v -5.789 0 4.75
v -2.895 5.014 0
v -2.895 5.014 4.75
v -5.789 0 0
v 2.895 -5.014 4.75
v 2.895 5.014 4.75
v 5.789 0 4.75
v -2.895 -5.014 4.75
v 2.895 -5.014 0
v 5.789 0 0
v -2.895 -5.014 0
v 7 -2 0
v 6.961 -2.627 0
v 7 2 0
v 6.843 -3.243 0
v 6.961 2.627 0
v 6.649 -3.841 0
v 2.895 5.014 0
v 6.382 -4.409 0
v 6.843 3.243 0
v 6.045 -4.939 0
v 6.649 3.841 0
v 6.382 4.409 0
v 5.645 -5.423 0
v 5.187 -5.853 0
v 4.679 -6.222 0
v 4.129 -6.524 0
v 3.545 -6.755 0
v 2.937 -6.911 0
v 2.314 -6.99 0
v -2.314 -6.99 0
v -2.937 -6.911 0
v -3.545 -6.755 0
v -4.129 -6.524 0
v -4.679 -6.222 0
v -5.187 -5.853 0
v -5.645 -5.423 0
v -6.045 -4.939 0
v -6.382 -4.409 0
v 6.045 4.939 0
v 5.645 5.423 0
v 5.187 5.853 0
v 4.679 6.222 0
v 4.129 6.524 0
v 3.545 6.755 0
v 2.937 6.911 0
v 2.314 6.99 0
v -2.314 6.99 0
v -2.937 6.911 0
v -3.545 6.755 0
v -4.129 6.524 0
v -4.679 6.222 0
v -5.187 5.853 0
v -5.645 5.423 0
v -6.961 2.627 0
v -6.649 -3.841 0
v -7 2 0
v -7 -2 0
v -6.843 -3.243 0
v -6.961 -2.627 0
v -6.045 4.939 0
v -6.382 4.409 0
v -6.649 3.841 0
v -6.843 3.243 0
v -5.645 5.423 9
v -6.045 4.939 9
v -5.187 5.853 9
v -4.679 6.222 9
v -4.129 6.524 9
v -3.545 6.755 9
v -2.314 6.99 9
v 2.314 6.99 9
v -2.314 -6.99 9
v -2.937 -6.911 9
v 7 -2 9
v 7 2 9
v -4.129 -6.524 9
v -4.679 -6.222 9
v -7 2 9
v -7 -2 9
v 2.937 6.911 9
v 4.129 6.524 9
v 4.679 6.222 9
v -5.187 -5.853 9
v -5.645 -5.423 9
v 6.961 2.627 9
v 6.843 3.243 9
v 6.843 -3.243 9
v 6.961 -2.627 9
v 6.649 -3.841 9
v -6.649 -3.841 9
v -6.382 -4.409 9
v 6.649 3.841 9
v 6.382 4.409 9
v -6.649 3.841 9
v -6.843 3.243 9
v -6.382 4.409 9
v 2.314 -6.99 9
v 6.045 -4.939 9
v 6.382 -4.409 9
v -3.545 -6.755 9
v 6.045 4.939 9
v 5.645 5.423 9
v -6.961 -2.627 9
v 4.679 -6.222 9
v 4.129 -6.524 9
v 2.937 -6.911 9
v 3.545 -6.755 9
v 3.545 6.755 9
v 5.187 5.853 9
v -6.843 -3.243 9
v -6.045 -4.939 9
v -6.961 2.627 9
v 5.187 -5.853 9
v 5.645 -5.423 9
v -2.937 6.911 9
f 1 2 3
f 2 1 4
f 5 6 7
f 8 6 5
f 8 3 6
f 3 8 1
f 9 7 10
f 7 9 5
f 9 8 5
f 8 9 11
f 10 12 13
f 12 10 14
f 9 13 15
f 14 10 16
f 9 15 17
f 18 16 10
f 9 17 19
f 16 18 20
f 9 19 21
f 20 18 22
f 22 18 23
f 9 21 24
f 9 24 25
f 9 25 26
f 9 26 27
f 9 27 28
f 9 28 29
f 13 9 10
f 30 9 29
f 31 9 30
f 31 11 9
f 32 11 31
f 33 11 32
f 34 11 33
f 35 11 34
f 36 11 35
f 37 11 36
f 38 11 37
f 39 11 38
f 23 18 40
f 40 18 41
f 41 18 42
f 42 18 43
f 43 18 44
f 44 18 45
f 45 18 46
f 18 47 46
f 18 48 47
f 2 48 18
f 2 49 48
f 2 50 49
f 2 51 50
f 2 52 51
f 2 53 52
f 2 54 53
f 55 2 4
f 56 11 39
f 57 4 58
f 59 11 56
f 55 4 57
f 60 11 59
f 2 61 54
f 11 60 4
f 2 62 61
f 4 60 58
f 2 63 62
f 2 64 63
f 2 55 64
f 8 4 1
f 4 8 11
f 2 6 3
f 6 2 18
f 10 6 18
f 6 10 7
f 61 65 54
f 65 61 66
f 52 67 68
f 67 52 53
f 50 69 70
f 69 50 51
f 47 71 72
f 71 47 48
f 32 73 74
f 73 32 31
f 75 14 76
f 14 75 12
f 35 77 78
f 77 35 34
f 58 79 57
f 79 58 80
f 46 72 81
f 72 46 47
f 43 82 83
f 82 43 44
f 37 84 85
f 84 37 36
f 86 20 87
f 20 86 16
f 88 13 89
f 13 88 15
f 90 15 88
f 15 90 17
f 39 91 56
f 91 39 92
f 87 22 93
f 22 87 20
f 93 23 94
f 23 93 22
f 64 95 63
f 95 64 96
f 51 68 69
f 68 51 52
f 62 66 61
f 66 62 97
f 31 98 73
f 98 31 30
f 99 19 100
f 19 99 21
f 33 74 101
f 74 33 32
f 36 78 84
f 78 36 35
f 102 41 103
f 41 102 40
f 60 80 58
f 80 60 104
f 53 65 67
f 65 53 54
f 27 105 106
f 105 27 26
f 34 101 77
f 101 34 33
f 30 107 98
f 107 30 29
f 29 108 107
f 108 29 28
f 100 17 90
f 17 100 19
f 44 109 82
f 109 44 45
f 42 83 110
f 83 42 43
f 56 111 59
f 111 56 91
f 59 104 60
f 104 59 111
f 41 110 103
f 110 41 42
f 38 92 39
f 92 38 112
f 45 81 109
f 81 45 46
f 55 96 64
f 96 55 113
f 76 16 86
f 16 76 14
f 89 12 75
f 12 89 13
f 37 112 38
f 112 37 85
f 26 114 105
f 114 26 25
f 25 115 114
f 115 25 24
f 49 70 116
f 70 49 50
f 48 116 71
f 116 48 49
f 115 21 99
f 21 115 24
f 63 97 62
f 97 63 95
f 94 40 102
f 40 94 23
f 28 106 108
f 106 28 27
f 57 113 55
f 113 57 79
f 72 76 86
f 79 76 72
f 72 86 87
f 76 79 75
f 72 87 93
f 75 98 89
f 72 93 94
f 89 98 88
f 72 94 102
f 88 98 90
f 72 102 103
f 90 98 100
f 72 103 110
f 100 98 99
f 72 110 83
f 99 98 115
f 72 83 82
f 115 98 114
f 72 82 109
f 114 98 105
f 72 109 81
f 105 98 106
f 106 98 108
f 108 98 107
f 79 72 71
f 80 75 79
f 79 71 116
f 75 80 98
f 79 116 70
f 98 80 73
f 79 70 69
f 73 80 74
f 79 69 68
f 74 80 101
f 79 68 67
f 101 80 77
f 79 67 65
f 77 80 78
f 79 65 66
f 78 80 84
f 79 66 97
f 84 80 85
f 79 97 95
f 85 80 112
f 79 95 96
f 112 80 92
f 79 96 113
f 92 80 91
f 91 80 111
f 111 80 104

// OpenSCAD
$fn = 50;


difference() {
	union() {
		hull() {
			translate(v = [-2.0000000000, 2.0000000000, 0]) {
				cylinder(h = 9, r = 5);
			}
			translate(v = [2.0000000000, 2.0000000000, 0]) {
				cylinder(h = 9, r = 5);
			}
			translate(v = [-2.0000000000, -2.0000000000, 0]) {
				cylinder(h = 9, r = 5);
			}
			translate(v = [2.0000000000, -2.0000000000, 0]) {
				cylinder(h = 9, r = 5);
			}
		}
	}
	union() {
		translate(v = [0, 0, 0]) {
			rotate(a = [0, 0, 0]) {
				difference() {
					union() {
						linear_extrude(height = 4.7500000000) {
							polygon(points = [[5.7892500000, 0.0000000000], [2.8946250000, 5.0136375689], [-2.8946250000, 5.0136375689], [-5.7892500000, 0.0000000000], [-2.8946250000, -5.0136375689], [2.8946250000, -5.0136375689]]);
						}
					}
					union();
				}
			}
		}
	}
}
